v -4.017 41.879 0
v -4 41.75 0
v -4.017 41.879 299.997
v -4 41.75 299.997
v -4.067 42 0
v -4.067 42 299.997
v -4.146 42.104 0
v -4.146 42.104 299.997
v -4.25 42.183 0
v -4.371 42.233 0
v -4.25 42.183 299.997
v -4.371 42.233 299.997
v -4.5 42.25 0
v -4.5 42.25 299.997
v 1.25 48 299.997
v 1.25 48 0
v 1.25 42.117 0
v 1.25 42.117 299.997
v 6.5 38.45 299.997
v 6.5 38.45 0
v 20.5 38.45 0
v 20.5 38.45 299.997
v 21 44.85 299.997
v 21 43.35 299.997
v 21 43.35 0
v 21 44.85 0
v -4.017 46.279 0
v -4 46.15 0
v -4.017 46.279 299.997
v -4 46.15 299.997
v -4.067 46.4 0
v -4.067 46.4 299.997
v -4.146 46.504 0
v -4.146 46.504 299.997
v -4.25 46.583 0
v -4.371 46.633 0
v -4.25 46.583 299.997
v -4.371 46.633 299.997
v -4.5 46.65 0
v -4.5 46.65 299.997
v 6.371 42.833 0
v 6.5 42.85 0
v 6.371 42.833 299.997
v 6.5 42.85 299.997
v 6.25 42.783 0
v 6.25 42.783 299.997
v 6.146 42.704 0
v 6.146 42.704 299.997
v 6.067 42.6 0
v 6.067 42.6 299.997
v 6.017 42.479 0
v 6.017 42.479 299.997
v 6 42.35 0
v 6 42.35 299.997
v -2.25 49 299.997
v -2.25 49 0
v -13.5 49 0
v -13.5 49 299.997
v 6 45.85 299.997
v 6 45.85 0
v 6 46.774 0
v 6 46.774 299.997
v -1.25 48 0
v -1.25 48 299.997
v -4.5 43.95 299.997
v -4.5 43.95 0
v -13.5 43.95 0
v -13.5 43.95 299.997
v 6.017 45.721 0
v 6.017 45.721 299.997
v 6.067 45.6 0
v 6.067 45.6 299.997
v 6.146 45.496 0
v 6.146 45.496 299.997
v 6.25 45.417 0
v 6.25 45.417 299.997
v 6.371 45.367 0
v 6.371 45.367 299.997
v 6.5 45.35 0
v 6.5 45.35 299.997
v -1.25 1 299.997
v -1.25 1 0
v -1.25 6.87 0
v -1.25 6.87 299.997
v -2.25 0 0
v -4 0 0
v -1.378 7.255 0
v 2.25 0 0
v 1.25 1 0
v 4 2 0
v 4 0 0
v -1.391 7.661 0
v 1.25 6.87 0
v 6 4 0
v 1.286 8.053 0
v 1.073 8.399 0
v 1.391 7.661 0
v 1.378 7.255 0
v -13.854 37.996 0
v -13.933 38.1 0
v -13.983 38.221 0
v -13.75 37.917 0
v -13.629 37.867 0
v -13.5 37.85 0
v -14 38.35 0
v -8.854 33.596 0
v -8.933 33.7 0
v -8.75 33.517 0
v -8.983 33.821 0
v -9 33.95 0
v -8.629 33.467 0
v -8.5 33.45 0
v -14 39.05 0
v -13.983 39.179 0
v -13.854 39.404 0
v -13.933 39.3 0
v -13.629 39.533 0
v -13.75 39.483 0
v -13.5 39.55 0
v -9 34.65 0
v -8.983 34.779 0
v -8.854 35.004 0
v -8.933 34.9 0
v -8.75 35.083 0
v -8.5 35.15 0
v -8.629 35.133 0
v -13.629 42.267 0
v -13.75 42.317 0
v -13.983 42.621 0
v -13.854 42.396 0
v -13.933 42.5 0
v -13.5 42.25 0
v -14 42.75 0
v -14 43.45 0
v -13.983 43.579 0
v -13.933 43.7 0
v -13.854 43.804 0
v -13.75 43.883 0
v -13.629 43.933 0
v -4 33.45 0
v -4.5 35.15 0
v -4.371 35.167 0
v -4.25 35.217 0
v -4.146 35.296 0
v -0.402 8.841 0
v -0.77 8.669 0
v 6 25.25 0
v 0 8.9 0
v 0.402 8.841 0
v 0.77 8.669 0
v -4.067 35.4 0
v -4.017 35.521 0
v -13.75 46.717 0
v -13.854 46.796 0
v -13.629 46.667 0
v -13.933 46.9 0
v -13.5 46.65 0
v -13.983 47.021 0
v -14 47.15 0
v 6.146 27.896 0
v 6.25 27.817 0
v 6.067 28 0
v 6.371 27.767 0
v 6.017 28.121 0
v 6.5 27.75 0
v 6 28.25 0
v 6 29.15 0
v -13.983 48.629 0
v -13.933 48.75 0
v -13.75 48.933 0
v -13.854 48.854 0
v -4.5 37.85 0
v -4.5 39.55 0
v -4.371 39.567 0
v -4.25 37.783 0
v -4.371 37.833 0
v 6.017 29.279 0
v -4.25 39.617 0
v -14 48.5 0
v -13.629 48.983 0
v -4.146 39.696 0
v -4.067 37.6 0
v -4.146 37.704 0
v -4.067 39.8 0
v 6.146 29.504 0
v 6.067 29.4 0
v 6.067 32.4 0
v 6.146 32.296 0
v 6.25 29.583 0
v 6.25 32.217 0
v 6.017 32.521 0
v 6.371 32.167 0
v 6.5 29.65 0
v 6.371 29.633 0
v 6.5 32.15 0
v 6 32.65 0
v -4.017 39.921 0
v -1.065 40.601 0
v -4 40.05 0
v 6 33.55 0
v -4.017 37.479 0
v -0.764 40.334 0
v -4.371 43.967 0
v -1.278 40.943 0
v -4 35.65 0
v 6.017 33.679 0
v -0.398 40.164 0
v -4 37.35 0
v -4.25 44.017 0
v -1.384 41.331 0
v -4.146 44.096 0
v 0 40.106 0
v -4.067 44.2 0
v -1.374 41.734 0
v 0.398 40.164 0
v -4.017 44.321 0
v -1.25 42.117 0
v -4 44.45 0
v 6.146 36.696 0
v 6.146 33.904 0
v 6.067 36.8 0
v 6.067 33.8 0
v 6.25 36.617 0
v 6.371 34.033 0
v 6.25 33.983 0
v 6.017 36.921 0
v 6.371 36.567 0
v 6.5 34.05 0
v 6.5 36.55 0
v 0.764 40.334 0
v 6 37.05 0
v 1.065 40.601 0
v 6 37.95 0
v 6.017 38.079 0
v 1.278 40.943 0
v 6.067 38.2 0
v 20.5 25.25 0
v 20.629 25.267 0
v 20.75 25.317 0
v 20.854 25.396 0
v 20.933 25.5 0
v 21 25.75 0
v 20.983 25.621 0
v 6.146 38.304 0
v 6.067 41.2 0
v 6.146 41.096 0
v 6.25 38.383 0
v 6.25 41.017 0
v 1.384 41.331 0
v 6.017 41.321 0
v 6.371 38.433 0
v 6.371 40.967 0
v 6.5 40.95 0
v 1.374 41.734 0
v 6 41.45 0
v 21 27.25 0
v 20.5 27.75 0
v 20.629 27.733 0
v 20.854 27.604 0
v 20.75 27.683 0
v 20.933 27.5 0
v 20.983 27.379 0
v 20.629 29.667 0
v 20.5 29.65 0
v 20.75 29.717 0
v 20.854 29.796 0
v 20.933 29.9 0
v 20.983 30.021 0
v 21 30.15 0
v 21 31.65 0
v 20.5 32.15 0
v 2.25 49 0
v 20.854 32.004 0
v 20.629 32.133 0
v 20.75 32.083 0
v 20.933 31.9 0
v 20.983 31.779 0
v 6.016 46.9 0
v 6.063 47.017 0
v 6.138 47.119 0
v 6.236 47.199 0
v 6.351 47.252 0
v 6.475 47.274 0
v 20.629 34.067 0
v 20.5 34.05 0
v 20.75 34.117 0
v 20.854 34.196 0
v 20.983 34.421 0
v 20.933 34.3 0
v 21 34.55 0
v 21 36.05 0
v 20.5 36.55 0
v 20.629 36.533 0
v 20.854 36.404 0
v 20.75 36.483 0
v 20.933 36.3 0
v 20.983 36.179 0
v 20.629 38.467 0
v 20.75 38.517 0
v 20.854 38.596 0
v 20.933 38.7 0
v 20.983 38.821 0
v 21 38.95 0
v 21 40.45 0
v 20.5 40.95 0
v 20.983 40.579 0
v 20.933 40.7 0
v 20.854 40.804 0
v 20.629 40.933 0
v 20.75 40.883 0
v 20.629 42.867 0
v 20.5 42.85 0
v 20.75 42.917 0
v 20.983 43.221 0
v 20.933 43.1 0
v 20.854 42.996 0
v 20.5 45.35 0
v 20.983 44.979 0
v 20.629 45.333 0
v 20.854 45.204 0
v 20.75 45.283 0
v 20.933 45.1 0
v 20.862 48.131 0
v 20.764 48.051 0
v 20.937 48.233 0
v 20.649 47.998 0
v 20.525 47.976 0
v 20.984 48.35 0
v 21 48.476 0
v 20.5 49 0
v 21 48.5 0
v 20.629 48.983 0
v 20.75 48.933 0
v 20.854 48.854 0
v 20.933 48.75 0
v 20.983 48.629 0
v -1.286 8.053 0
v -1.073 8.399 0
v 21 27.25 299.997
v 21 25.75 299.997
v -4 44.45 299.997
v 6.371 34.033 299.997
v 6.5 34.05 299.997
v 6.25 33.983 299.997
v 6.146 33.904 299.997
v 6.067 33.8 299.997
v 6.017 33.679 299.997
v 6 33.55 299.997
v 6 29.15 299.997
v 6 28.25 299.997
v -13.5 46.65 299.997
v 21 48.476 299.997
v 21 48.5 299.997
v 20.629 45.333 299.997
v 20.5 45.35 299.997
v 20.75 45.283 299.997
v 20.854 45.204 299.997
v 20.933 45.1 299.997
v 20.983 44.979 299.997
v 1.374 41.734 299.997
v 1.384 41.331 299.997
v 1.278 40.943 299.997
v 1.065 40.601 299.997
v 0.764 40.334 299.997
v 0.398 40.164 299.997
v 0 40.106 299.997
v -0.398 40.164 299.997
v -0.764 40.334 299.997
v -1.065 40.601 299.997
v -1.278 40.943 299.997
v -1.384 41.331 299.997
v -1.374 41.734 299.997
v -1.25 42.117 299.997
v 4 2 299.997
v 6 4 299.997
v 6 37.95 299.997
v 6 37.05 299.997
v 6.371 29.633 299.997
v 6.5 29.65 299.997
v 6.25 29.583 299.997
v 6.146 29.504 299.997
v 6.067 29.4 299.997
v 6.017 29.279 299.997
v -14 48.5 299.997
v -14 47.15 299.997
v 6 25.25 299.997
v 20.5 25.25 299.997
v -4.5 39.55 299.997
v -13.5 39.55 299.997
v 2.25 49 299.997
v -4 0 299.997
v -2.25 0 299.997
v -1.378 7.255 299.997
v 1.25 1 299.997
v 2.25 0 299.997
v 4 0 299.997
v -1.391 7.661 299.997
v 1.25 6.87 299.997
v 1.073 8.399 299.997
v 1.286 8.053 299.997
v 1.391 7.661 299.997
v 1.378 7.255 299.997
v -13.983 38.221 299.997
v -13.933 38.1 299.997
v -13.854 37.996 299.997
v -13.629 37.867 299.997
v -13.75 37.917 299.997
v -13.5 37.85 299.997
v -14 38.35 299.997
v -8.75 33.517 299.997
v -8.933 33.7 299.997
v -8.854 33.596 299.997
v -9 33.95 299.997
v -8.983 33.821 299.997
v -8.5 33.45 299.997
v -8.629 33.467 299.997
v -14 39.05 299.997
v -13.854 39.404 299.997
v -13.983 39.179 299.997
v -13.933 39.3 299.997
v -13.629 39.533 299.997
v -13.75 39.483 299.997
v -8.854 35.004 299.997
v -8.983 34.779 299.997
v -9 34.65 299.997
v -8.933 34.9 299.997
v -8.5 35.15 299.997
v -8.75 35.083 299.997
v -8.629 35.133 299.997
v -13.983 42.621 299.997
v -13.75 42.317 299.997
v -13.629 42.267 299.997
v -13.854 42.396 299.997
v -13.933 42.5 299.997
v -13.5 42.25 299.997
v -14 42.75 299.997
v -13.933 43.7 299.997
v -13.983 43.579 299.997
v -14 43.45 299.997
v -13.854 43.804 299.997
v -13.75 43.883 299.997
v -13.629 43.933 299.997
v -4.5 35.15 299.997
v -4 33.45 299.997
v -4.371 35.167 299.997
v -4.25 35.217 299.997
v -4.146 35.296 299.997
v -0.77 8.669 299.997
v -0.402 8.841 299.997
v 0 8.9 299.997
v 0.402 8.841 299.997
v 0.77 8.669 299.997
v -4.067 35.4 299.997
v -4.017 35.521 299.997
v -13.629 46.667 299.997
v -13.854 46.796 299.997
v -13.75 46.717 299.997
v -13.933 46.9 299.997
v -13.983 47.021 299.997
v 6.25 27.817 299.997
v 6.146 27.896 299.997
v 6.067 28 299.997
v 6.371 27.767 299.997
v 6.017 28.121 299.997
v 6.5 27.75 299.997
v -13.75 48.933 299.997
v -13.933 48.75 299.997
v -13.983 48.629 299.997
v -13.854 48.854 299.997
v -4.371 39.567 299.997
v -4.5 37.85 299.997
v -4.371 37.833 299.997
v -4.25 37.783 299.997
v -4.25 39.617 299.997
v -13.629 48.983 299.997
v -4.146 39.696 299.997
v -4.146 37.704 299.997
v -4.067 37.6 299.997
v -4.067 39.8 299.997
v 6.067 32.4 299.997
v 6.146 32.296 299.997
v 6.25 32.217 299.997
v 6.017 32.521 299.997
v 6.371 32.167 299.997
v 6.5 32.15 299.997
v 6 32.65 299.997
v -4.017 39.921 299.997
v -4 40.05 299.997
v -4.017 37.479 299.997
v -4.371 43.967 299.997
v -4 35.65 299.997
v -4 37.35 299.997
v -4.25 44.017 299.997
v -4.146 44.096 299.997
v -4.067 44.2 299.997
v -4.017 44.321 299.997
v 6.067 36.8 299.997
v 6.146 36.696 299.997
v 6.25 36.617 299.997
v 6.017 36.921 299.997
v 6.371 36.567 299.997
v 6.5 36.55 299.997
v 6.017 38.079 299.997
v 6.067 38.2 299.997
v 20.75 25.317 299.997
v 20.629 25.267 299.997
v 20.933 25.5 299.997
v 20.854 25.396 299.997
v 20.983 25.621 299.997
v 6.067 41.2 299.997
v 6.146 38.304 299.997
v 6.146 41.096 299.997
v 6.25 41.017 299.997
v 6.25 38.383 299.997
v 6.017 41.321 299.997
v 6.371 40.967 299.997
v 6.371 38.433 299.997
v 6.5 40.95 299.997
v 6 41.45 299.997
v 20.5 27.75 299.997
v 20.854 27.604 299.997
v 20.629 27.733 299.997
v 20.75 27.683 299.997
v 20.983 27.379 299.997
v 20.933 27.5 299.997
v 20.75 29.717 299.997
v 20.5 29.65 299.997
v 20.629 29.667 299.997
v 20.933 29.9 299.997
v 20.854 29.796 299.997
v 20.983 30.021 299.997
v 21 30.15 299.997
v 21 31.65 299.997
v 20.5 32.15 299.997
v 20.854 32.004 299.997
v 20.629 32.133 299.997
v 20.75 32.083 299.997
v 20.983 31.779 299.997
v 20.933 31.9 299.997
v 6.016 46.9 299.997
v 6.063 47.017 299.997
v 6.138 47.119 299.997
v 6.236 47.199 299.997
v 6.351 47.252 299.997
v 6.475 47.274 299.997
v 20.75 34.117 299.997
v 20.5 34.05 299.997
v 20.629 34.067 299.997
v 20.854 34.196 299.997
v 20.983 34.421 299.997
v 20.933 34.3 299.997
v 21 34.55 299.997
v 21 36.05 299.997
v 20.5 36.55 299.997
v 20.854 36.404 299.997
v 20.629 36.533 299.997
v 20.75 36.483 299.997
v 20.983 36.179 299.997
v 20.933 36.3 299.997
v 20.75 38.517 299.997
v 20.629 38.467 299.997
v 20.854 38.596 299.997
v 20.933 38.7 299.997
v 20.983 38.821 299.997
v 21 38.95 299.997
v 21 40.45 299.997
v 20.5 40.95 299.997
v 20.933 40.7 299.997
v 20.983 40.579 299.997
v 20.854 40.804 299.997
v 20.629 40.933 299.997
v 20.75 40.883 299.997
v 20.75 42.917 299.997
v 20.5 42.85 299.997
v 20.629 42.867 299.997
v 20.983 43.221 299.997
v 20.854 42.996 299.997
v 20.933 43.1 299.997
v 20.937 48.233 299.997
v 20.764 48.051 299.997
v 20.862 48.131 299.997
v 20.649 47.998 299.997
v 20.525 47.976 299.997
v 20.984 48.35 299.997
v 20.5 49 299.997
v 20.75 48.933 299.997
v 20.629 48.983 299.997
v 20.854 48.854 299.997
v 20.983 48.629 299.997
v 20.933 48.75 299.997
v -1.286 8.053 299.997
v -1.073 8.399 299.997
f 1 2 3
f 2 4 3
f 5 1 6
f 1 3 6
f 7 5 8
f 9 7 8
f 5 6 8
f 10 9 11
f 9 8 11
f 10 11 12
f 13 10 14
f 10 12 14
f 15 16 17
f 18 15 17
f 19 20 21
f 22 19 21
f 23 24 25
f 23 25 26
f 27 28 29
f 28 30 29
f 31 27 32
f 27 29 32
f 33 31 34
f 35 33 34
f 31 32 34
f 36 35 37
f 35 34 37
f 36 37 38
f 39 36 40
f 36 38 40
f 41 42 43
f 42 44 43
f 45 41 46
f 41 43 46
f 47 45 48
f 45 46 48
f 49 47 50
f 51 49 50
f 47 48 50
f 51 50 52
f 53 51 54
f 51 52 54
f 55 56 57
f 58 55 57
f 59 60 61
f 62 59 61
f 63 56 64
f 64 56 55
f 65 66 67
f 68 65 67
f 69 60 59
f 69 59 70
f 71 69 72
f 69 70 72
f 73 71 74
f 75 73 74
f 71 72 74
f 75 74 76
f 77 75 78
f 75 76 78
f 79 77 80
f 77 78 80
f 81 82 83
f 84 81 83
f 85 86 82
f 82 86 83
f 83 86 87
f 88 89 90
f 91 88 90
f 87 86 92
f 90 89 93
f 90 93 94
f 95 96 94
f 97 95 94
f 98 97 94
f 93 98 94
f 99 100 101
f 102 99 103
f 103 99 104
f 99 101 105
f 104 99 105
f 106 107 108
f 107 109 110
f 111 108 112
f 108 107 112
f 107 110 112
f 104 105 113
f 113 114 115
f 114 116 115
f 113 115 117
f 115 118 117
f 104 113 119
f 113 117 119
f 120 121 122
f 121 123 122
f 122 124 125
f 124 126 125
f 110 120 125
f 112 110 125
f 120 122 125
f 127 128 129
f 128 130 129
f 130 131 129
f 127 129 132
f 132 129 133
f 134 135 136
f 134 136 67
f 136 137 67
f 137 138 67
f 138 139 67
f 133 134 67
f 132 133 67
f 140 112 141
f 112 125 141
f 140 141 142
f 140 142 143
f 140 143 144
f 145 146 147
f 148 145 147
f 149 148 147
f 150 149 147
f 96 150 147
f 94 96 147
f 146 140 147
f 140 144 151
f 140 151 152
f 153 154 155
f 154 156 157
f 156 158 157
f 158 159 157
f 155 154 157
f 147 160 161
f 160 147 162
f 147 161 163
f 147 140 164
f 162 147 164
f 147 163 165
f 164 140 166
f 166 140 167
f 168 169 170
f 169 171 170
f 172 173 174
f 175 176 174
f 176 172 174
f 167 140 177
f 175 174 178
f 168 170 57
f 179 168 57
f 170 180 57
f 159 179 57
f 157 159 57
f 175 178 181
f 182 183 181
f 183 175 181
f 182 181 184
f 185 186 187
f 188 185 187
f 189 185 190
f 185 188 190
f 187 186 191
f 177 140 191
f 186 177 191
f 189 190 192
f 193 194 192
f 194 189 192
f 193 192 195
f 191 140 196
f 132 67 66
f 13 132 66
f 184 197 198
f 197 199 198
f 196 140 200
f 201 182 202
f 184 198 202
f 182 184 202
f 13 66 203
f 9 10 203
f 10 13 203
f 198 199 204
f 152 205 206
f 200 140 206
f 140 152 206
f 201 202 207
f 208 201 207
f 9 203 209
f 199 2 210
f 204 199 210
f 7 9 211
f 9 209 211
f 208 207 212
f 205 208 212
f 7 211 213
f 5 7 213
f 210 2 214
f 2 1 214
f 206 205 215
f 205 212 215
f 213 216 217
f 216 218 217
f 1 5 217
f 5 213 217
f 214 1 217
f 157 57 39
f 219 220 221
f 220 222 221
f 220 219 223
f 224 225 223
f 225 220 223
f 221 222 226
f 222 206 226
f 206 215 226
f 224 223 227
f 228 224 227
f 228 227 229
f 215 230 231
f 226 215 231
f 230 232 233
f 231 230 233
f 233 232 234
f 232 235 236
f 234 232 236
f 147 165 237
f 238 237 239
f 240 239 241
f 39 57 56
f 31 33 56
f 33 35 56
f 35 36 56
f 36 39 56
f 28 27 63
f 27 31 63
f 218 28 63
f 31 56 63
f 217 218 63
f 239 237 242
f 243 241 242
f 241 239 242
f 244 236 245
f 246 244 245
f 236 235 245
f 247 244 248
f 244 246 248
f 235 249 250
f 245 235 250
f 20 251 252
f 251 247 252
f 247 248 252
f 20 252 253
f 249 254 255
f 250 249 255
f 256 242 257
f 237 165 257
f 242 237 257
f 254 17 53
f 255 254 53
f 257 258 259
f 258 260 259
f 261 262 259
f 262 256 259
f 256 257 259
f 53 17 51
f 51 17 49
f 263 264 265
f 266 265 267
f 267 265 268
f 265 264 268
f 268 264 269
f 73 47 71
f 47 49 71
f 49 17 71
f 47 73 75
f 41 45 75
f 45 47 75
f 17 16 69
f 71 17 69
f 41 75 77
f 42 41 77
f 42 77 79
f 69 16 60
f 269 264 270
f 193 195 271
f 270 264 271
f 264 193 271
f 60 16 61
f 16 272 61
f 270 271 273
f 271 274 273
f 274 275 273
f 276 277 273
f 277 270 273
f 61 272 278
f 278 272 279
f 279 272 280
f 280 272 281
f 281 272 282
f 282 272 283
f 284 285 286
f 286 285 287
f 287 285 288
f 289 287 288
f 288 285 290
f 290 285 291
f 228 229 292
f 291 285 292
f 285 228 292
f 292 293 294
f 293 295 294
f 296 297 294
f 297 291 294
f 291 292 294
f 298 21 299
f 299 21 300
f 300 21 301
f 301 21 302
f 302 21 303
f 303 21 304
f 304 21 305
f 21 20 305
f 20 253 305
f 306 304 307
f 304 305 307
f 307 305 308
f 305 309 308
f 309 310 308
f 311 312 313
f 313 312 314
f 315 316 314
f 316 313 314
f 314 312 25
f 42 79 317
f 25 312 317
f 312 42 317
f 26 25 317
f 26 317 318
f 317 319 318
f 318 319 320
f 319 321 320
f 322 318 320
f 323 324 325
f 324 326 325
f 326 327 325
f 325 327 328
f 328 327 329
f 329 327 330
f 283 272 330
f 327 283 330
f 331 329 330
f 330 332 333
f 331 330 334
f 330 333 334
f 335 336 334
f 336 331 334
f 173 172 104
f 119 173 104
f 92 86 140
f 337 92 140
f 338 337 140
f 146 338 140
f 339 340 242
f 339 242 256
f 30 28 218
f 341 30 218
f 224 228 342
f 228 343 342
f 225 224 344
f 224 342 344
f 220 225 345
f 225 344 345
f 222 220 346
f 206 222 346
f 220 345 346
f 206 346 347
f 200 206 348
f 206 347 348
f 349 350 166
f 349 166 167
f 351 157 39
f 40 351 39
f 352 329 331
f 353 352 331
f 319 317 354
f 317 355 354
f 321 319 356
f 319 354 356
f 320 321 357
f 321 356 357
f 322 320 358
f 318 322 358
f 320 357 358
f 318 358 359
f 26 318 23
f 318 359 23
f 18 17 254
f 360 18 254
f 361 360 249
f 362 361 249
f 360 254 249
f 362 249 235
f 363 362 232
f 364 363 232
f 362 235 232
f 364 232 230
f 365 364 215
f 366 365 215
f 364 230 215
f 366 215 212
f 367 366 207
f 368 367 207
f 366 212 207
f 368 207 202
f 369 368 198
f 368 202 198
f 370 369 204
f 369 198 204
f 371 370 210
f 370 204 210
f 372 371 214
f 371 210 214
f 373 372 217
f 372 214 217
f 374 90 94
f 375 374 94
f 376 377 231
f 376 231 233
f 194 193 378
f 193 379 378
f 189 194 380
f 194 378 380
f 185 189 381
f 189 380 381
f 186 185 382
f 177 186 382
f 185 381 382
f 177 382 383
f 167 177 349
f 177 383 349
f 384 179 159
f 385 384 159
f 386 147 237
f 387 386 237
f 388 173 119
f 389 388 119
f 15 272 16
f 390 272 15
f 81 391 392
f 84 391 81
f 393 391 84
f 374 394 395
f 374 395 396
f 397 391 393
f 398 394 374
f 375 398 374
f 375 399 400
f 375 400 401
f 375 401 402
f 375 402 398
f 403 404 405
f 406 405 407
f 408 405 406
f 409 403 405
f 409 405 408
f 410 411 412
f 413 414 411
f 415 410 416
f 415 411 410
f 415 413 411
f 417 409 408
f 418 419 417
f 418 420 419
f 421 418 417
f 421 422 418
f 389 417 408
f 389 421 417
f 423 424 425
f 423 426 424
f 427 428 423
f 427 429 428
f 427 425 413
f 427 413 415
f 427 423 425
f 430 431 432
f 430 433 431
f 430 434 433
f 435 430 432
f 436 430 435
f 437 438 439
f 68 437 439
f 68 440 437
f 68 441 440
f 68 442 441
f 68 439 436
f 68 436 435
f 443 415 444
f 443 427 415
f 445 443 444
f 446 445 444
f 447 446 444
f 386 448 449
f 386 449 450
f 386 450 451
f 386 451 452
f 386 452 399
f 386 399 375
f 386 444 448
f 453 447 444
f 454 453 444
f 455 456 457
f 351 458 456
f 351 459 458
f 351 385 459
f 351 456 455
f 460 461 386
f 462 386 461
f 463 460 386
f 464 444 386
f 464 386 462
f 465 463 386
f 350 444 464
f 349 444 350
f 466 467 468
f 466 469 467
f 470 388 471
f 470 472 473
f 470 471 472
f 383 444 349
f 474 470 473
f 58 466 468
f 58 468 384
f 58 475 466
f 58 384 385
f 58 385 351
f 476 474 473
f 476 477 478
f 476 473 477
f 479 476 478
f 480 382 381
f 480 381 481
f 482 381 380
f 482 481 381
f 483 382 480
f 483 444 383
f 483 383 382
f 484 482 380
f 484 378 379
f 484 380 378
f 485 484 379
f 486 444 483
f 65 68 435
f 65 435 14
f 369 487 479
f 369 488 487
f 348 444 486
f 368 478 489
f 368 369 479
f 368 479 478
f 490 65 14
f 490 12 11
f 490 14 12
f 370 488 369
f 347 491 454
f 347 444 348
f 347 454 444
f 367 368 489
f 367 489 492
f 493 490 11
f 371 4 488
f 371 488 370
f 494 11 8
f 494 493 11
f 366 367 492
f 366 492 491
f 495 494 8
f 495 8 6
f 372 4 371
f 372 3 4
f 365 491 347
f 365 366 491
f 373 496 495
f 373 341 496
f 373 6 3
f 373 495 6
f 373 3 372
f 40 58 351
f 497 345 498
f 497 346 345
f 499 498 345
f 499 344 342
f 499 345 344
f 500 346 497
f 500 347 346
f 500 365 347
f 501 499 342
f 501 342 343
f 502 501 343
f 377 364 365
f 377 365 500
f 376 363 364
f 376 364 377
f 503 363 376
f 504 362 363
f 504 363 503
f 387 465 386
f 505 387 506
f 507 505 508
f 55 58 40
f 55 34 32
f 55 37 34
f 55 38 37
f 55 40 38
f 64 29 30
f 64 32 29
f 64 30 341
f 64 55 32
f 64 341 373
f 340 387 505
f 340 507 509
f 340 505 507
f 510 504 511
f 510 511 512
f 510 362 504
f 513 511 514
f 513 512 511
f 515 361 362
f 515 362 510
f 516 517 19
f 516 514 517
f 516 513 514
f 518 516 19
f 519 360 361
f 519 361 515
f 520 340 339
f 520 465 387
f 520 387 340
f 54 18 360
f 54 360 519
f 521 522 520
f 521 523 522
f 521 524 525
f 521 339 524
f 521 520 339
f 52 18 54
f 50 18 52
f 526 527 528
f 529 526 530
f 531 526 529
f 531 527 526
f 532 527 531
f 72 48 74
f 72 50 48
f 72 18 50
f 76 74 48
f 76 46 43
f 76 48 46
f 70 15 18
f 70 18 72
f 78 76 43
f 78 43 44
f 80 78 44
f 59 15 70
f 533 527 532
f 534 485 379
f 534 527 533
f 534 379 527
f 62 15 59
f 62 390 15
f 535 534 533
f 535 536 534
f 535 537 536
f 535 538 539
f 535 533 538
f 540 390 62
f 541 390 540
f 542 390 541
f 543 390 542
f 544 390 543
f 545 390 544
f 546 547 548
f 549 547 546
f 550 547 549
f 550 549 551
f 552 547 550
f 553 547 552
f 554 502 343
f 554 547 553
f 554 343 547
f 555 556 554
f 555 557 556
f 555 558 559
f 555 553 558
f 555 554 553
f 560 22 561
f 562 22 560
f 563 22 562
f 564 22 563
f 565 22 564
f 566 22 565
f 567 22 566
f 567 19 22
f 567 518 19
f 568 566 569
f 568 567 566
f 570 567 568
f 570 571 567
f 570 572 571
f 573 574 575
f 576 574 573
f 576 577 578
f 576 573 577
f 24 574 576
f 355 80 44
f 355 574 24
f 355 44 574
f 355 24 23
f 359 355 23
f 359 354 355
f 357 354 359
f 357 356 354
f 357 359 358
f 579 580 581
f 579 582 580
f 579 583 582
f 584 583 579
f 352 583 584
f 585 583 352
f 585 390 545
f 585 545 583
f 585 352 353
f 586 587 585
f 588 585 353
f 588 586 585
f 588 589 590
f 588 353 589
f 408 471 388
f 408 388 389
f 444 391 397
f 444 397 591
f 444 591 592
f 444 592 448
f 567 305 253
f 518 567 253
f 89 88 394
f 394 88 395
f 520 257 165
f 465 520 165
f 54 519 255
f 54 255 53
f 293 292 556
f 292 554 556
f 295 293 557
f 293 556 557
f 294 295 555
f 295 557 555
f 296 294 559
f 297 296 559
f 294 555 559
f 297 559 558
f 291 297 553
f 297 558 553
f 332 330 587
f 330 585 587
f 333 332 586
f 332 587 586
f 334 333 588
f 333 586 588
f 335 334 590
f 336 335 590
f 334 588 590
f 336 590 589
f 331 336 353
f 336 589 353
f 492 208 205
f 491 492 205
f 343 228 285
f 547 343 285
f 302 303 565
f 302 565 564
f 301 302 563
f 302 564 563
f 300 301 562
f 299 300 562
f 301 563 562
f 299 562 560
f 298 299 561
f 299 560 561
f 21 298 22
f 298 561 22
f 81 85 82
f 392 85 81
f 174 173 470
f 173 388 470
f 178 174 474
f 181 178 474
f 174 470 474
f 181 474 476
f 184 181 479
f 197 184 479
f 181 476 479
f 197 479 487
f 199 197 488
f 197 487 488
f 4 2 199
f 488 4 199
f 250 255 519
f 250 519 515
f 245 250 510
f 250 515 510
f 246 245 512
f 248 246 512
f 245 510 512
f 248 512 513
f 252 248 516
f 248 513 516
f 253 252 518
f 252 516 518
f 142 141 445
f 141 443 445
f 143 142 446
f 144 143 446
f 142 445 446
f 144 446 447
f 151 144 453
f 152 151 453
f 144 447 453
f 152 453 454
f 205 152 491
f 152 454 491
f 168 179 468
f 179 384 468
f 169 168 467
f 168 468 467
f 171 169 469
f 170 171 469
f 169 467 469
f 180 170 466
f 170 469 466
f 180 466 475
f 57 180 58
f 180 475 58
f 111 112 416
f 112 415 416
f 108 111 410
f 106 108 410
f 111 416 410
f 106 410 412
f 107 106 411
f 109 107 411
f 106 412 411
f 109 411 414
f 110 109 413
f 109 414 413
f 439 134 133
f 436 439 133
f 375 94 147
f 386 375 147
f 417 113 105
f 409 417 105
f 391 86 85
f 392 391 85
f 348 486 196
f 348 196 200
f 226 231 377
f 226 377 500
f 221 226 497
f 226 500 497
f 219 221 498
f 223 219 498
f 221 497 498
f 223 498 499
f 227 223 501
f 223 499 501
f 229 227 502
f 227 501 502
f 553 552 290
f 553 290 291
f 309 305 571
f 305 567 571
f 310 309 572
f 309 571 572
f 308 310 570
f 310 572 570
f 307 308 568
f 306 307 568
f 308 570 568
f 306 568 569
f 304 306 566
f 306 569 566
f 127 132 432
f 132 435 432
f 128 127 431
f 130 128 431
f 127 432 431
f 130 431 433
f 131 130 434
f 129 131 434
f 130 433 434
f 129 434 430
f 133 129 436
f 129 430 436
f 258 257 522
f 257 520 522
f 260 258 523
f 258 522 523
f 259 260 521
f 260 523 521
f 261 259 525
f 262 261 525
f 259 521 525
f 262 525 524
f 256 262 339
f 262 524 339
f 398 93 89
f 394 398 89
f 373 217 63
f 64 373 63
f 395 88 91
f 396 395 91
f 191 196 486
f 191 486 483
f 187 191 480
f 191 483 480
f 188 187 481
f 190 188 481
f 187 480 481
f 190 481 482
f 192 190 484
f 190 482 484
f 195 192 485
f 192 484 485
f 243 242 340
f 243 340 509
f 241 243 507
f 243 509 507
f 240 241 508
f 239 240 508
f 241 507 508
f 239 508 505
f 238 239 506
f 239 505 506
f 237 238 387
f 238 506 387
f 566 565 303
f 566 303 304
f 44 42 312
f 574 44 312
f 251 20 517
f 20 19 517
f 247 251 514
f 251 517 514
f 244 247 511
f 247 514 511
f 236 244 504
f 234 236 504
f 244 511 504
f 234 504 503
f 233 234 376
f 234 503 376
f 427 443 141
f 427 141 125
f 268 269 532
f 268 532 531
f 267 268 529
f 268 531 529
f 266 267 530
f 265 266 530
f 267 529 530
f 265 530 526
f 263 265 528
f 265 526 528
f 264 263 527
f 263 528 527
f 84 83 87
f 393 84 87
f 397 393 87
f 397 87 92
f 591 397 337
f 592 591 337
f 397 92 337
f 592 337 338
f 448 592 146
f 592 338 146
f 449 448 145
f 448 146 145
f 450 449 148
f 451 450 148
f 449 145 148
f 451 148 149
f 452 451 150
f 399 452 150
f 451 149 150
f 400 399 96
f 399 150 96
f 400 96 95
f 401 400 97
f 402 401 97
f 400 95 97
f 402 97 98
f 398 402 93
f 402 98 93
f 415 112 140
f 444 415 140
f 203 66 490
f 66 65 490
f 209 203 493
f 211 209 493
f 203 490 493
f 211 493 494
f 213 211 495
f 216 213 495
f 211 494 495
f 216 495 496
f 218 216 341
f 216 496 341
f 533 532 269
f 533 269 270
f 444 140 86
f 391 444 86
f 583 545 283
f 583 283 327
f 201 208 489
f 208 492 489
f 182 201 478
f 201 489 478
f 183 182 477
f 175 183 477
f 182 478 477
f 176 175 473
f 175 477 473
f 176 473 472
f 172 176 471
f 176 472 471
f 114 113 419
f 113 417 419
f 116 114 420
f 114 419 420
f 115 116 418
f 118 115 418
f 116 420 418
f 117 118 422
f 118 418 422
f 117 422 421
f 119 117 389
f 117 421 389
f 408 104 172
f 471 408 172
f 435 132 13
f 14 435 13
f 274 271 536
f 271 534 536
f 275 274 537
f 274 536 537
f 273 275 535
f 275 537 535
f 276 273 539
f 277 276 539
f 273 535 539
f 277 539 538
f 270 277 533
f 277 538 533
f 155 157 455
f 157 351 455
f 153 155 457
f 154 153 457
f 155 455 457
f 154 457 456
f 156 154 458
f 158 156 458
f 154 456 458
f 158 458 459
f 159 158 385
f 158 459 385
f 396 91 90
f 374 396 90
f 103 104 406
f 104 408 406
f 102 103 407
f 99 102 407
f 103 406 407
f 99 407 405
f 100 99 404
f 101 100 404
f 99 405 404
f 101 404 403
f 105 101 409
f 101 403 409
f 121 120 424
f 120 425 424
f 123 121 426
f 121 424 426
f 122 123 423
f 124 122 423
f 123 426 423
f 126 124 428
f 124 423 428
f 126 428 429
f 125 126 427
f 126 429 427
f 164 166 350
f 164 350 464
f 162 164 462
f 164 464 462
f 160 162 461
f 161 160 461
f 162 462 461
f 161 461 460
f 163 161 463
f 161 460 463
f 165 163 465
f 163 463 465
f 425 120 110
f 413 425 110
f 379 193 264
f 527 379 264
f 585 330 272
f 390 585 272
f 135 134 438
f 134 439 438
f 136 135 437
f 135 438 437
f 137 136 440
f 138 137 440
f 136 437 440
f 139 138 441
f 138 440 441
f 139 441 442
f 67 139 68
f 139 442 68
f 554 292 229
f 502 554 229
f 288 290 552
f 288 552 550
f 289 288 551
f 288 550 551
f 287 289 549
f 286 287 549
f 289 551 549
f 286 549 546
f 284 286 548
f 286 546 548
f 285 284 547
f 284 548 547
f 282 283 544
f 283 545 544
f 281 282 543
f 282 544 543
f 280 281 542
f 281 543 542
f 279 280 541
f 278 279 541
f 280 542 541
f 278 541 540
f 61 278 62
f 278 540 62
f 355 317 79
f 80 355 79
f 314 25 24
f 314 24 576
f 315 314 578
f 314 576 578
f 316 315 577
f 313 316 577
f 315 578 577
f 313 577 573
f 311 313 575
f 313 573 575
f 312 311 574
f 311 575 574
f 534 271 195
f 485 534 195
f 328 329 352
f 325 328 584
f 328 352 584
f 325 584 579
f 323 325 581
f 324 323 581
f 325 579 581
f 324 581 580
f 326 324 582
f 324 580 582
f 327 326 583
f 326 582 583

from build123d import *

# Parameters (mm, degrees)
EXTRUDE_1_DEPTH = 299.99673285
CHAMFER_1_SIZE  = 1
CHAMFER_2_SIZE  = 1
FILLET_1_R      = 0.5
FILLET_2_R      = 0.5
FILLET_3_R      = 0.5
FILLET_4_R      = 0.5
FILLET_5_R      = 0.5
FILLET_6_R      = 0.5
FILLET_7_R      = 0.5
CHAMFER_4_SIZE  = 1
CHAMFER_5_SIZE  = 1


with BuildPart() as part:
    # Эскиз1 → Бобышка-Вытянуть1 (new body)
    with BuildSketch(Plane.XY):
        with BuildLine():
            Line((-1.25, 0), (-1.25, 6.869523989))
            ThreePointArc((-1.25, 6.869523989), (0, 8.9), (1.25, 6.869523989))
            Line((1.25, 6.869523989), (1.25, 0))
            Line((1.25, 0), (4, 0))
            Line((4, 0), (4, 2))
            Line((4, 2), (6, 4))
            Line((6, 4), (6, 25.25))
            Line((6, 25.25), (21, 25.25))
            Line((21, 25.25), (21, 27.75))
            Line((21, 27.75), (6, 27.75))
            Line((6, 27.75), (6, 29.65))
            Line((6, 29.65), (21, 29.65))
            Line((21, 29.65), (21, 32.15))
            Line((21, 32.15), (6, 32.15))
            Line((6, 32.15), (6, 34.05))
            Line((6, 34.05), (21, 34.05))
            Line((21, 34.05), (21, 36.55))
            Line((21, 36.55), (6, 36.55))
            Line((6, 36.55), (6, 38.45))
            Line((6, 38.45), (21, 38.45))
            Line((21, 38.45), (21, 40.95))
            Line((21, 40.95), (6, 40.95))
            Line((6, 40.95), (6, 42.85))
            Line((6, 42.85), (21, 42.85))
            Line((21, 42.85), (21, 45.35))
            Line((21, 45.35), (6, 45.35))
            Line((6, 45.35), (6, 47.25))
            Line((6, 47.25), (21, 48))
            Line((21, 48), (21, 49))
            Line((21, 49), (1.25, 49))
            Line((1.25, 49), (1.25, 42.116940633))
            ThreePointArc((1.25, 42.116940633), (0, 40.106043134), (-1.25, 42.116940633))
            Line((-1.25, 42.116940633), (-1.25, 49))
            Line((-1.25, 49), (-14, 49))
            Line((-14, 49), (-14, 46.65))
            Line((-14, 46.65), (-4, 46.65))
            Line((-4, 46.65), (-4, 43.95))
            Line((-4, 43.95), (-14, 43.95))
            Line((-14, 43.95), (-14, 42.25))
            Line((-14, 42.25), (-4, 42.25))
            Line((-4, 42.25), (-4, 39.55))
            Line((-4, 39.55), (-14, 39.55))
            Line((-14, 39.55), (-14, 37.85))
            Line((-14, 37.85), (-4, 37.85))
            Line((-4, 37.85), (-4, 35.15))
            Line((-4, 35.15), (-9, 35.15))
            Line((-9, 35.15), (-9, 33.45))
            Line((-9, 33.45), (-4, 33.45))
            Line((-4, 33.45), (-4, 0))
            Line((-4, 0), (-1.25, 0))
        make_face()
    extrude(amount=EXTRUDE_1_DEPTH)

    # Фаска1
    chamfer_1_edges = [part.edges().sort_by_distance(p)[0] for p in [
        (-1.25, 0, 149.998366425),
    ]]
    chamfer(chamfer_1_edges, length=CHAMFER_1_SIZE)

    # Фаска2
    chamfer_2_edges = [part.edges().sort_by_distance(p)[0] for p in [
        (1.25, 0, 149.998366425),
    ]]
    chamfer(chamfer_2_edges, length=CHAMFER_2_SIZE)

    # Скругление1
    fillet_1_edges = [part.edges().sort_by_distance(p)[0] for p in [
        (-9, 33.45, 149.998366425),
        (-9, 35.15, 149.998366425),
        (-14, 37.85, 149.998366425),
        (-14, 39.55, 149.998366425),
        (-14, 42.25, 149.998366425),
        (-14, 43.95, 149.998366425),
        (-14, 46.65, 149.998366425),
    ]]
    fillet(fillet_1_edges, radius=FILLET_1_R)

    # Скругление2
    fillet_2_edges = [part.edges().sort_by_distance(p)[0] for p in [
        (-4, 35.15, 149.998366425),
        (-4, 39.55, 149.998366425),
        (-4, 43.95, 149.998366425),
    ]]
    fillet(fillet_2_edges, radius=FILLET_2_R)

    # Скругление3
    fillet_3_edges = [part.edges().sort_by_distance(p)[0] for p in [
        (-4, 37.85, 149.998366425),
        (-4, 42.25, 149.998366425),
        (-4, 46.65, 149.998366425),
    ]]
    fillet(fillet_3_edges, radius=FILLET_3_R)

    # Скругление4
    fillet_4_edges = [part.edges().sort_by_distance(p)[0] for p in [
        (-14, 49, 149.998366425),
    ]]
    fillet(fillet_4_edges, radius=FILLET_4_R)

    # Скругление5
    fillet_5_edges = [part.edges().sort_by_distance(p)[0] for p in [
        (21, 49, 149.998366425),
        (21, 48, 149.998366425),
        (21, 45.35, 149.998366425),
        (21, 42.85, 149.998366425),
        (21, 40.95, 149.998366425),
        (21, 38.45, 149.998366425),
        (21, 36.55, 149.998366425),
        (21, 34.05, 149.998366425),
        (21, 32.15, 149.998366425),
        (21, 29.65, 149.998366425),
        (21, 27.75, 149.998366425),
        (21, 25.25, 149.998366425),
    ]]
    fillet(fillet_5_edges, radius=FILLET_5_R)

    # Скругление6
    fillet_6_edges = [part.edges().sort_by_distance(p)[0] for p in [
        (6, 47.25, 149.998366425),
        (6, 42.85, 149.998366425),
        (6, 38.45, 149.998366425),
        (6, 34.05, 149.998366425),
        (6, 29.65, 149.998366425),
    ]]
    fillet(fillet_6_edges, radius=FILLET_6_R)

    # Скругление7
    fillet_7_edges = [part.edges().sort_by_distance(p)[0] for p in [
        (6, 45.35, 149.998366425),
        (6, 40.95, 149.998366425),
        (6, 36.55, 149.998366425),
        (6, 32.15, 149.998366425),
        (6, 27.75, 149.998366425),
    ]]
    fillet(fillet_7_edges, radius=FILLET_7_R)

    # Фаска4
    chamfer_4_edges = [part.edges().sort_by_distance(p)[0] for p in [
        (-1.25, 49, 149.998366425),
    ]]
    chamfer(chamfer_4_edges, length=CHAMFER_4_SIZE)

    # Фаска5
    chamfer_5_edges = [part.edges().sort_by_distance(p)[0] for p in [
        (1.25, 49, 149.998366425),
    ]]
    chamfer(chamfer_5_edges, length=CHAMFER_5_SIZE)


solid = part.part
